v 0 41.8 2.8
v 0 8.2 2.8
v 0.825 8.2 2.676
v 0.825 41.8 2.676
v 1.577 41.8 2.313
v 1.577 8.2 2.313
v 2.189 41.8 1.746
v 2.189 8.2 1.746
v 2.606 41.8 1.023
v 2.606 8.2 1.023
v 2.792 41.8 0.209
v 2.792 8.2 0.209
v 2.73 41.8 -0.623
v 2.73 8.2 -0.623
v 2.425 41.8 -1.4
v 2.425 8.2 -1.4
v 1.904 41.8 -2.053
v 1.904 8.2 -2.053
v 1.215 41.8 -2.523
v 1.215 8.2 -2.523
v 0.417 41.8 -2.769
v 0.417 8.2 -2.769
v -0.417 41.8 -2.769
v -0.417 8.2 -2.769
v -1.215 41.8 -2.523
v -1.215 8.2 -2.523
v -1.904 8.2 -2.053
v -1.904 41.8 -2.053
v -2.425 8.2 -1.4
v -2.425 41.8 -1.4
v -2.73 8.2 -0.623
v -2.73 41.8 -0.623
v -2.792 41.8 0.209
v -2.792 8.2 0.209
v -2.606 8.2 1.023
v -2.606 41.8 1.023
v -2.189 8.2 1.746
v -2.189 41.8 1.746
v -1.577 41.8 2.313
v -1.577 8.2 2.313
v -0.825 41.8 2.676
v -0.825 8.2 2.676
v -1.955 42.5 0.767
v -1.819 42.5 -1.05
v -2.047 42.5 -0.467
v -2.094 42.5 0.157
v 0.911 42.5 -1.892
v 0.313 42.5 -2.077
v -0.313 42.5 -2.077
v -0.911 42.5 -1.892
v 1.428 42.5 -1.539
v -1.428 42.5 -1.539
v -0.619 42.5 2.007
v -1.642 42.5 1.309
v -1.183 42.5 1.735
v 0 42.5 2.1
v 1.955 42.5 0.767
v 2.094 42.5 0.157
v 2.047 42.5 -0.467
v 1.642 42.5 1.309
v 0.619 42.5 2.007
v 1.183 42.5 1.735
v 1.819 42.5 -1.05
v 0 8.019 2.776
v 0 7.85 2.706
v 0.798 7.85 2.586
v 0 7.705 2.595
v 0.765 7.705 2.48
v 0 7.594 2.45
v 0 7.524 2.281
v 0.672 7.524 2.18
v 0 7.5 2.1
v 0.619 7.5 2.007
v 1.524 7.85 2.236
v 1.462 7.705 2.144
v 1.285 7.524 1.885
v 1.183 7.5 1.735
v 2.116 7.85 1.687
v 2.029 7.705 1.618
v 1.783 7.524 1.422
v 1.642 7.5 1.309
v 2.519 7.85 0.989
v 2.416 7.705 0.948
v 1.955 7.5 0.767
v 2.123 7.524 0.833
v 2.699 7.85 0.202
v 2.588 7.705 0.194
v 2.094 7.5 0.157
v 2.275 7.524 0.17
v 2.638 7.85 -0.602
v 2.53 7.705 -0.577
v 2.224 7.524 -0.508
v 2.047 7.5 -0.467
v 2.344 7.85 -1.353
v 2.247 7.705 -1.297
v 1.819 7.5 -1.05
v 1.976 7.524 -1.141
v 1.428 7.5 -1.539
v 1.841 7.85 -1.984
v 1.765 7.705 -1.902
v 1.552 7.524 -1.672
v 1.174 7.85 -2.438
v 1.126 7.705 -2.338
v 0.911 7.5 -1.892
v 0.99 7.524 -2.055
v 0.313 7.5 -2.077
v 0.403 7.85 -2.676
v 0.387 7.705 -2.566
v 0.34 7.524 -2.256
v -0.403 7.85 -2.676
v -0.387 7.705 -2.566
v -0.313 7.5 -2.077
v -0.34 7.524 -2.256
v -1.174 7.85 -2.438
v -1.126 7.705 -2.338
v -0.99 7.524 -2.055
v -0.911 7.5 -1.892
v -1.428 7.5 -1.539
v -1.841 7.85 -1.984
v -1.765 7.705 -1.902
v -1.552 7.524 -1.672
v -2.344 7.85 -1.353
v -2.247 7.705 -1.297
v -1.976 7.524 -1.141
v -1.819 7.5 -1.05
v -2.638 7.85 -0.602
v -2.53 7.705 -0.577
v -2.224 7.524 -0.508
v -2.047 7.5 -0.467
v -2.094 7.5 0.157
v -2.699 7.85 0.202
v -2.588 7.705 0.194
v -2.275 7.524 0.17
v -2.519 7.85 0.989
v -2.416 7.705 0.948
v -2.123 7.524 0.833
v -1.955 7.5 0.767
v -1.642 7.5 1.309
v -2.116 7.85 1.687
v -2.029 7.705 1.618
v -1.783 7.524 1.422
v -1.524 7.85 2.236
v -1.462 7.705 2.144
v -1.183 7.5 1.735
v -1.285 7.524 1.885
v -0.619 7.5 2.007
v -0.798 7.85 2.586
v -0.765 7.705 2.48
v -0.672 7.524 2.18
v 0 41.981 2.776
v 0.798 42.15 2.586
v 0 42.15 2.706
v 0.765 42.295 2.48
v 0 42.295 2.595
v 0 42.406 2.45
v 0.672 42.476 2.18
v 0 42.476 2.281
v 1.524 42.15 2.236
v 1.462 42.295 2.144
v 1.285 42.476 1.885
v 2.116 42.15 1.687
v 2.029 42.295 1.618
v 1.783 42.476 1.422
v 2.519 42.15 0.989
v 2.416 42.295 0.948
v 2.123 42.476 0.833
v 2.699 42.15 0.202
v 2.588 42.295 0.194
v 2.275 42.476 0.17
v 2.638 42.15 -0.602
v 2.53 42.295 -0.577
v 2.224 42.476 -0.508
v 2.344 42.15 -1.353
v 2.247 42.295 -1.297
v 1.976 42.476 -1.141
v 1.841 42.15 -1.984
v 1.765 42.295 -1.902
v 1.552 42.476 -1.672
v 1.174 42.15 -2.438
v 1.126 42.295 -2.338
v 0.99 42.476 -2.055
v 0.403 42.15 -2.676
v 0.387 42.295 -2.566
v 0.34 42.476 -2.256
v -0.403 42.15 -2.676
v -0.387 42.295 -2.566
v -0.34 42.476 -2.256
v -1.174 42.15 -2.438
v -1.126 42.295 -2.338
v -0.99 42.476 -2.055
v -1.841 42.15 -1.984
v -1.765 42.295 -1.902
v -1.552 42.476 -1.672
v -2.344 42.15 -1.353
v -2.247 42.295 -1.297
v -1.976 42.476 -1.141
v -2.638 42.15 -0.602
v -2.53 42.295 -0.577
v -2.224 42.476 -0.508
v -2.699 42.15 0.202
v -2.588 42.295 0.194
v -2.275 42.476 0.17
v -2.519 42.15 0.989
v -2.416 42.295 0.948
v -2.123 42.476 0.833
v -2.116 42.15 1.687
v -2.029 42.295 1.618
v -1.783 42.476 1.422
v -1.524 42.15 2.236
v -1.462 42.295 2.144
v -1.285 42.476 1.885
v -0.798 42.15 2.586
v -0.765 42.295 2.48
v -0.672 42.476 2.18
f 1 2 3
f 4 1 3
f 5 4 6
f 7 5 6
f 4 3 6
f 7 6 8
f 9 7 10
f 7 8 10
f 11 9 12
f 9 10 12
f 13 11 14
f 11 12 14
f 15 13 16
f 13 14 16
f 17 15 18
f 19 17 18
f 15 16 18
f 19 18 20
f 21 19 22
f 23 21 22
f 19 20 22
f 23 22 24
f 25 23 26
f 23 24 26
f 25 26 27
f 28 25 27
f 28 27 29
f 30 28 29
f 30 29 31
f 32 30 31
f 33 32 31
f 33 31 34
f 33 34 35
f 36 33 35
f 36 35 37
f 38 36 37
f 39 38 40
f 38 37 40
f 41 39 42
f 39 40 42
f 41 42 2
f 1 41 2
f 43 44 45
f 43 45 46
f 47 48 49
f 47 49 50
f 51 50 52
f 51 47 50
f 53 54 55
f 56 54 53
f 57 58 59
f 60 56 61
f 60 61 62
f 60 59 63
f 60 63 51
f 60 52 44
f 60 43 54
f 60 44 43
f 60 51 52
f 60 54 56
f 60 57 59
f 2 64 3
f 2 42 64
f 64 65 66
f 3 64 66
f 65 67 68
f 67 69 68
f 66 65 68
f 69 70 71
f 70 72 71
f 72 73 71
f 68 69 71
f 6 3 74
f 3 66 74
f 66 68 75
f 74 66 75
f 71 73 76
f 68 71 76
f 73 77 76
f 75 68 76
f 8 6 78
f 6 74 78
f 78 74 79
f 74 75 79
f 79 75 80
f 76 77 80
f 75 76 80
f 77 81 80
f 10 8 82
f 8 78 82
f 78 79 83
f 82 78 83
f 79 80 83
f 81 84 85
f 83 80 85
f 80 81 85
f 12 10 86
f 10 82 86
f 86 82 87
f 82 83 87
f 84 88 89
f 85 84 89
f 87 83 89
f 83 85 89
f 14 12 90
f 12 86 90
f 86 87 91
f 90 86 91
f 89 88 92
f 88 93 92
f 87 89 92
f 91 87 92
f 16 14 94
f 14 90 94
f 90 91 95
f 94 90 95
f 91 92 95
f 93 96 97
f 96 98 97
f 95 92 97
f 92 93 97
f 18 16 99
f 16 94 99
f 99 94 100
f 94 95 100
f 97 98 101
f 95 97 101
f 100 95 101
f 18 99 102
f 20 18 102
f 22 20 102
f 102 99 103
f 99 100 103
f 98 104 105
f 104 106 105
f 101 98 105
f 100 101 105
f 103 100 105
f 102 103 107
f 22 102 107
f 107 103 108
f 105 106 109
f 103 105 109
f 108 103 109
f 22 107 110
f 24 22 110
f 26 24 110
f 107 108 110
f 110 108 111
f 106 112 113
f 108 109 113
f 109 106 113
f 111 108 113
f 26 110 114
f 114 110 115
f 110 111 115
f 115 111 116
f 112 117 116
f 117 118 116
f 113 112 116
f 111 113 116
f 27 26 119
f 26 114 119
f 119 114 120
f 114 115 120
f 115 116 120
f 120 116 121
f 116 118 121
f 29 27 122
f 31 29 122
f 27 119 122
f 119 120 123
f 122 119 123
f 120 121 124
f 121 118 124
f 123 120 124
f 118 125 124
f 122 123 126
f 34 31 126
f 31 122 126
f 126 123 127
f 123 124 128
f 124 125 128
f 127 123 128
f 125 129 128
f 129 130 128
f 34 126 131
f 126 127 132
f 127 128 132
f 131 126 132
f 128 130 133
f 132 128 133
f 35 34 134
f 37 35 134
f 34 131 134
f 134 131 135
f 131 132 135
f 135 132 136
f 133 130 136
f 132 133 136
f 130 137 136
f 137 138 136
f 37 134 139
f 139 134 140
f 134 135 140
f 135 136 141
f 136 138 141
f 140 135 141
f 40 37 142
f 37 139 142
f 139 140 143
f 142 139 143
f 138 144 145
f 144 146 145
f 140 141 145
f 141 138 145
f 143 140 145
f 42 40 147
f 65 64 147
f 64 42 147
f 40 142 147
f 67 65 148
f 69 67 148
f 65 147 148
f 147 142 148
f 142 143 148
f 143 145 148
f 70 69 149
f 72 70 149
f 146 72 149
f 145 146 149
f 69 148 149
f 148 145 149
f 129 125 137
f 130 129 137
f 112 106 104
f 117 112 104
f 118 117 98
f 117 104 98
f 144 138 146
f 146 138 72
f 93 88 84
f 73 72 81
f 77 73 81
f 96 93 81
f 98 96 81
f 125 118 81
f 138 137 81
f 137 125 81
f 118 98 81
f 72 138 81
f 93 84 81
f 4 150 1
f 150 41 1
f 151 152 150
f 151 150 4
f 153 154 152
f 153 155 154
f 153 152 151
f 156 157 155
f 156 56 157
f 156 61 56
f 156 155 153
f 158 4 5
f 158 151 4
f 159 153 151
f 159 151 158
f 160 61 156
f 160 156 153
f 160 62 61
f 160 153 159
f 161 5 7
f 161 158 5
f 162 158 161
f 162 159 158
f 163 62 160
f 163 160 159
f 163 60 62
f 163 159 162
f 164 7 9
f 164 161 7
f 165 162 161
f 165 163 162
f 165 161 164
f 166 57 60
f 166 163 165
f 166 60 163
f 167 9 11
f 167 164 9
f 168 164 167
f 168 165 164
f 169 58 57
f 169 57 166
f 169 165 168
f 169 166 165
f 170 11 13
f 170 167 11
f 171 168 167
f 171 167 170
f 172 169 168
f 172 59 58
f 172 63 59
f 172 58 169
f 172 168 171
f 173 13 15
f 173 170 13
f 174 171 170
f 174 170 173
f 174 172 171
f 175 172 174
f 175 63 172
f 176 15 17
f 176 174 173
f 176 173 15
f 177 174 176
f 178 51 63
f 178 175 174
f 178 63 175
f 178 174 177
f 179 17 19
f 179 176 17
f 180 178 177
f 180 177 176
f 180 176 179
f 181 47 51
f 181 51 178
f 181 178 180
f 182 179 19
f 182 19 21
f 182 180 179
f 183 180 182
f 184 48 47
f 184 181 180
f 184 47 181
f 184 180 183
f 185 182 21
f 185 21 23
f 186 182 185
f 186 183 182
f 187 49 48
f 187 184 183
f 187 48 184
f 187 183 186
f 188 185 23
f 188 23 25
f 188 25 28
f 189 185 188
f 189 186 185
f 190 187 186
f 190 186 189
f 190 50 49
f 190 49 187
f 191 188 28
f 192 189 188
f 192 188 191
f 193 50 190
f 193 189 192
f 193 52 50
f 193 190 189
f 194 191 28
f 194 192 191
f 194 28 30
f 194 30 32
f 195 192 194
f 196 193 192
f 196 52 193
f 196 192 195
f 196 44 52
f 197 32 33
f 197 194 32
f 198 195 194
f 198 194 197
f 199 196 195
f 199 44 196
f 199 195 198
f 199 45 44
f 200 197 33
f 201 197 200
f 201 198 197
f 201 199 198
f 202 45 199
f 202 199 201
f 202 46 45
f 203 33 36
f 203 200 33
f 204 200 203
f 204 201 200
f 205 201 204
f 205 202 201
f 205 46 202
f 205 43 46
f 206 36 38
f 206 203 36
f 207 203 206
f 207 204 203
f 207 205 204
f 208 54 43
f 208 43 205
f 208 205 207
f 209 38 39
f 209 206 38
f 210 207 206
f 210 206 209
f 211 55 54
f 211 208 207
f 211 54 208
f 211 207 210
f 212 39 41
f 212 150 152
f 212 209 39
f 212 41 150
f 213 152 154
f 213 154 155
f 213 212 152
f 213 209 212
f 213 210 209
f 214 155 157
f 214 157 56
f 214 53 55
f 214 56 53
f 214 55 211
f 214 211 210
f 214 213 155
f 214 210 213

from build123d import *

# Parameters (mm, degrees)
SKETCH1_R           = 4
BOSS_EXTRUDE1_DEPTH = 50
FILLET1_R           = 1
FILLET2_R           = 1
SCALE1_SCALE        = 0.7


with BuildPart() as part:
    # Sketch1 → Boss-Extrude1 (new body)
    with BuildSketch(Plane(origin=(0, 0, 0), x_dir=(1, 0, 0), z_dir=(0, 1, 0))):
        with Locations(Location((0, 0, 0), (0, 0, 270))):
            Circle(SKETCH1_R)
    extrude(amount=BOSS_EXTRUDE1_DEPTH)

    # Fillet1
    fillet1_edges = [part.edges().sort_by_distance(p)[0] for p in [
        (0, 50, -4),
    ]]
    fillet(fillet1_edges, radius=FILLET1_R)

    # Fillet2
    fillet2_edges = [part.edges().sort_by_distance(p)[0] for p in [
        (0, 0, -4),
    ]]
    fillet(fillet2_edges, radius=FILLET2_R)


with BuildPart() as part_1:
    # Scale1: scaled about (0, 25, 0)
    add(part.part.scale(SCALE1_SCALE).moved(Location((0, 7.5, 0))))


solid = part_1.part
